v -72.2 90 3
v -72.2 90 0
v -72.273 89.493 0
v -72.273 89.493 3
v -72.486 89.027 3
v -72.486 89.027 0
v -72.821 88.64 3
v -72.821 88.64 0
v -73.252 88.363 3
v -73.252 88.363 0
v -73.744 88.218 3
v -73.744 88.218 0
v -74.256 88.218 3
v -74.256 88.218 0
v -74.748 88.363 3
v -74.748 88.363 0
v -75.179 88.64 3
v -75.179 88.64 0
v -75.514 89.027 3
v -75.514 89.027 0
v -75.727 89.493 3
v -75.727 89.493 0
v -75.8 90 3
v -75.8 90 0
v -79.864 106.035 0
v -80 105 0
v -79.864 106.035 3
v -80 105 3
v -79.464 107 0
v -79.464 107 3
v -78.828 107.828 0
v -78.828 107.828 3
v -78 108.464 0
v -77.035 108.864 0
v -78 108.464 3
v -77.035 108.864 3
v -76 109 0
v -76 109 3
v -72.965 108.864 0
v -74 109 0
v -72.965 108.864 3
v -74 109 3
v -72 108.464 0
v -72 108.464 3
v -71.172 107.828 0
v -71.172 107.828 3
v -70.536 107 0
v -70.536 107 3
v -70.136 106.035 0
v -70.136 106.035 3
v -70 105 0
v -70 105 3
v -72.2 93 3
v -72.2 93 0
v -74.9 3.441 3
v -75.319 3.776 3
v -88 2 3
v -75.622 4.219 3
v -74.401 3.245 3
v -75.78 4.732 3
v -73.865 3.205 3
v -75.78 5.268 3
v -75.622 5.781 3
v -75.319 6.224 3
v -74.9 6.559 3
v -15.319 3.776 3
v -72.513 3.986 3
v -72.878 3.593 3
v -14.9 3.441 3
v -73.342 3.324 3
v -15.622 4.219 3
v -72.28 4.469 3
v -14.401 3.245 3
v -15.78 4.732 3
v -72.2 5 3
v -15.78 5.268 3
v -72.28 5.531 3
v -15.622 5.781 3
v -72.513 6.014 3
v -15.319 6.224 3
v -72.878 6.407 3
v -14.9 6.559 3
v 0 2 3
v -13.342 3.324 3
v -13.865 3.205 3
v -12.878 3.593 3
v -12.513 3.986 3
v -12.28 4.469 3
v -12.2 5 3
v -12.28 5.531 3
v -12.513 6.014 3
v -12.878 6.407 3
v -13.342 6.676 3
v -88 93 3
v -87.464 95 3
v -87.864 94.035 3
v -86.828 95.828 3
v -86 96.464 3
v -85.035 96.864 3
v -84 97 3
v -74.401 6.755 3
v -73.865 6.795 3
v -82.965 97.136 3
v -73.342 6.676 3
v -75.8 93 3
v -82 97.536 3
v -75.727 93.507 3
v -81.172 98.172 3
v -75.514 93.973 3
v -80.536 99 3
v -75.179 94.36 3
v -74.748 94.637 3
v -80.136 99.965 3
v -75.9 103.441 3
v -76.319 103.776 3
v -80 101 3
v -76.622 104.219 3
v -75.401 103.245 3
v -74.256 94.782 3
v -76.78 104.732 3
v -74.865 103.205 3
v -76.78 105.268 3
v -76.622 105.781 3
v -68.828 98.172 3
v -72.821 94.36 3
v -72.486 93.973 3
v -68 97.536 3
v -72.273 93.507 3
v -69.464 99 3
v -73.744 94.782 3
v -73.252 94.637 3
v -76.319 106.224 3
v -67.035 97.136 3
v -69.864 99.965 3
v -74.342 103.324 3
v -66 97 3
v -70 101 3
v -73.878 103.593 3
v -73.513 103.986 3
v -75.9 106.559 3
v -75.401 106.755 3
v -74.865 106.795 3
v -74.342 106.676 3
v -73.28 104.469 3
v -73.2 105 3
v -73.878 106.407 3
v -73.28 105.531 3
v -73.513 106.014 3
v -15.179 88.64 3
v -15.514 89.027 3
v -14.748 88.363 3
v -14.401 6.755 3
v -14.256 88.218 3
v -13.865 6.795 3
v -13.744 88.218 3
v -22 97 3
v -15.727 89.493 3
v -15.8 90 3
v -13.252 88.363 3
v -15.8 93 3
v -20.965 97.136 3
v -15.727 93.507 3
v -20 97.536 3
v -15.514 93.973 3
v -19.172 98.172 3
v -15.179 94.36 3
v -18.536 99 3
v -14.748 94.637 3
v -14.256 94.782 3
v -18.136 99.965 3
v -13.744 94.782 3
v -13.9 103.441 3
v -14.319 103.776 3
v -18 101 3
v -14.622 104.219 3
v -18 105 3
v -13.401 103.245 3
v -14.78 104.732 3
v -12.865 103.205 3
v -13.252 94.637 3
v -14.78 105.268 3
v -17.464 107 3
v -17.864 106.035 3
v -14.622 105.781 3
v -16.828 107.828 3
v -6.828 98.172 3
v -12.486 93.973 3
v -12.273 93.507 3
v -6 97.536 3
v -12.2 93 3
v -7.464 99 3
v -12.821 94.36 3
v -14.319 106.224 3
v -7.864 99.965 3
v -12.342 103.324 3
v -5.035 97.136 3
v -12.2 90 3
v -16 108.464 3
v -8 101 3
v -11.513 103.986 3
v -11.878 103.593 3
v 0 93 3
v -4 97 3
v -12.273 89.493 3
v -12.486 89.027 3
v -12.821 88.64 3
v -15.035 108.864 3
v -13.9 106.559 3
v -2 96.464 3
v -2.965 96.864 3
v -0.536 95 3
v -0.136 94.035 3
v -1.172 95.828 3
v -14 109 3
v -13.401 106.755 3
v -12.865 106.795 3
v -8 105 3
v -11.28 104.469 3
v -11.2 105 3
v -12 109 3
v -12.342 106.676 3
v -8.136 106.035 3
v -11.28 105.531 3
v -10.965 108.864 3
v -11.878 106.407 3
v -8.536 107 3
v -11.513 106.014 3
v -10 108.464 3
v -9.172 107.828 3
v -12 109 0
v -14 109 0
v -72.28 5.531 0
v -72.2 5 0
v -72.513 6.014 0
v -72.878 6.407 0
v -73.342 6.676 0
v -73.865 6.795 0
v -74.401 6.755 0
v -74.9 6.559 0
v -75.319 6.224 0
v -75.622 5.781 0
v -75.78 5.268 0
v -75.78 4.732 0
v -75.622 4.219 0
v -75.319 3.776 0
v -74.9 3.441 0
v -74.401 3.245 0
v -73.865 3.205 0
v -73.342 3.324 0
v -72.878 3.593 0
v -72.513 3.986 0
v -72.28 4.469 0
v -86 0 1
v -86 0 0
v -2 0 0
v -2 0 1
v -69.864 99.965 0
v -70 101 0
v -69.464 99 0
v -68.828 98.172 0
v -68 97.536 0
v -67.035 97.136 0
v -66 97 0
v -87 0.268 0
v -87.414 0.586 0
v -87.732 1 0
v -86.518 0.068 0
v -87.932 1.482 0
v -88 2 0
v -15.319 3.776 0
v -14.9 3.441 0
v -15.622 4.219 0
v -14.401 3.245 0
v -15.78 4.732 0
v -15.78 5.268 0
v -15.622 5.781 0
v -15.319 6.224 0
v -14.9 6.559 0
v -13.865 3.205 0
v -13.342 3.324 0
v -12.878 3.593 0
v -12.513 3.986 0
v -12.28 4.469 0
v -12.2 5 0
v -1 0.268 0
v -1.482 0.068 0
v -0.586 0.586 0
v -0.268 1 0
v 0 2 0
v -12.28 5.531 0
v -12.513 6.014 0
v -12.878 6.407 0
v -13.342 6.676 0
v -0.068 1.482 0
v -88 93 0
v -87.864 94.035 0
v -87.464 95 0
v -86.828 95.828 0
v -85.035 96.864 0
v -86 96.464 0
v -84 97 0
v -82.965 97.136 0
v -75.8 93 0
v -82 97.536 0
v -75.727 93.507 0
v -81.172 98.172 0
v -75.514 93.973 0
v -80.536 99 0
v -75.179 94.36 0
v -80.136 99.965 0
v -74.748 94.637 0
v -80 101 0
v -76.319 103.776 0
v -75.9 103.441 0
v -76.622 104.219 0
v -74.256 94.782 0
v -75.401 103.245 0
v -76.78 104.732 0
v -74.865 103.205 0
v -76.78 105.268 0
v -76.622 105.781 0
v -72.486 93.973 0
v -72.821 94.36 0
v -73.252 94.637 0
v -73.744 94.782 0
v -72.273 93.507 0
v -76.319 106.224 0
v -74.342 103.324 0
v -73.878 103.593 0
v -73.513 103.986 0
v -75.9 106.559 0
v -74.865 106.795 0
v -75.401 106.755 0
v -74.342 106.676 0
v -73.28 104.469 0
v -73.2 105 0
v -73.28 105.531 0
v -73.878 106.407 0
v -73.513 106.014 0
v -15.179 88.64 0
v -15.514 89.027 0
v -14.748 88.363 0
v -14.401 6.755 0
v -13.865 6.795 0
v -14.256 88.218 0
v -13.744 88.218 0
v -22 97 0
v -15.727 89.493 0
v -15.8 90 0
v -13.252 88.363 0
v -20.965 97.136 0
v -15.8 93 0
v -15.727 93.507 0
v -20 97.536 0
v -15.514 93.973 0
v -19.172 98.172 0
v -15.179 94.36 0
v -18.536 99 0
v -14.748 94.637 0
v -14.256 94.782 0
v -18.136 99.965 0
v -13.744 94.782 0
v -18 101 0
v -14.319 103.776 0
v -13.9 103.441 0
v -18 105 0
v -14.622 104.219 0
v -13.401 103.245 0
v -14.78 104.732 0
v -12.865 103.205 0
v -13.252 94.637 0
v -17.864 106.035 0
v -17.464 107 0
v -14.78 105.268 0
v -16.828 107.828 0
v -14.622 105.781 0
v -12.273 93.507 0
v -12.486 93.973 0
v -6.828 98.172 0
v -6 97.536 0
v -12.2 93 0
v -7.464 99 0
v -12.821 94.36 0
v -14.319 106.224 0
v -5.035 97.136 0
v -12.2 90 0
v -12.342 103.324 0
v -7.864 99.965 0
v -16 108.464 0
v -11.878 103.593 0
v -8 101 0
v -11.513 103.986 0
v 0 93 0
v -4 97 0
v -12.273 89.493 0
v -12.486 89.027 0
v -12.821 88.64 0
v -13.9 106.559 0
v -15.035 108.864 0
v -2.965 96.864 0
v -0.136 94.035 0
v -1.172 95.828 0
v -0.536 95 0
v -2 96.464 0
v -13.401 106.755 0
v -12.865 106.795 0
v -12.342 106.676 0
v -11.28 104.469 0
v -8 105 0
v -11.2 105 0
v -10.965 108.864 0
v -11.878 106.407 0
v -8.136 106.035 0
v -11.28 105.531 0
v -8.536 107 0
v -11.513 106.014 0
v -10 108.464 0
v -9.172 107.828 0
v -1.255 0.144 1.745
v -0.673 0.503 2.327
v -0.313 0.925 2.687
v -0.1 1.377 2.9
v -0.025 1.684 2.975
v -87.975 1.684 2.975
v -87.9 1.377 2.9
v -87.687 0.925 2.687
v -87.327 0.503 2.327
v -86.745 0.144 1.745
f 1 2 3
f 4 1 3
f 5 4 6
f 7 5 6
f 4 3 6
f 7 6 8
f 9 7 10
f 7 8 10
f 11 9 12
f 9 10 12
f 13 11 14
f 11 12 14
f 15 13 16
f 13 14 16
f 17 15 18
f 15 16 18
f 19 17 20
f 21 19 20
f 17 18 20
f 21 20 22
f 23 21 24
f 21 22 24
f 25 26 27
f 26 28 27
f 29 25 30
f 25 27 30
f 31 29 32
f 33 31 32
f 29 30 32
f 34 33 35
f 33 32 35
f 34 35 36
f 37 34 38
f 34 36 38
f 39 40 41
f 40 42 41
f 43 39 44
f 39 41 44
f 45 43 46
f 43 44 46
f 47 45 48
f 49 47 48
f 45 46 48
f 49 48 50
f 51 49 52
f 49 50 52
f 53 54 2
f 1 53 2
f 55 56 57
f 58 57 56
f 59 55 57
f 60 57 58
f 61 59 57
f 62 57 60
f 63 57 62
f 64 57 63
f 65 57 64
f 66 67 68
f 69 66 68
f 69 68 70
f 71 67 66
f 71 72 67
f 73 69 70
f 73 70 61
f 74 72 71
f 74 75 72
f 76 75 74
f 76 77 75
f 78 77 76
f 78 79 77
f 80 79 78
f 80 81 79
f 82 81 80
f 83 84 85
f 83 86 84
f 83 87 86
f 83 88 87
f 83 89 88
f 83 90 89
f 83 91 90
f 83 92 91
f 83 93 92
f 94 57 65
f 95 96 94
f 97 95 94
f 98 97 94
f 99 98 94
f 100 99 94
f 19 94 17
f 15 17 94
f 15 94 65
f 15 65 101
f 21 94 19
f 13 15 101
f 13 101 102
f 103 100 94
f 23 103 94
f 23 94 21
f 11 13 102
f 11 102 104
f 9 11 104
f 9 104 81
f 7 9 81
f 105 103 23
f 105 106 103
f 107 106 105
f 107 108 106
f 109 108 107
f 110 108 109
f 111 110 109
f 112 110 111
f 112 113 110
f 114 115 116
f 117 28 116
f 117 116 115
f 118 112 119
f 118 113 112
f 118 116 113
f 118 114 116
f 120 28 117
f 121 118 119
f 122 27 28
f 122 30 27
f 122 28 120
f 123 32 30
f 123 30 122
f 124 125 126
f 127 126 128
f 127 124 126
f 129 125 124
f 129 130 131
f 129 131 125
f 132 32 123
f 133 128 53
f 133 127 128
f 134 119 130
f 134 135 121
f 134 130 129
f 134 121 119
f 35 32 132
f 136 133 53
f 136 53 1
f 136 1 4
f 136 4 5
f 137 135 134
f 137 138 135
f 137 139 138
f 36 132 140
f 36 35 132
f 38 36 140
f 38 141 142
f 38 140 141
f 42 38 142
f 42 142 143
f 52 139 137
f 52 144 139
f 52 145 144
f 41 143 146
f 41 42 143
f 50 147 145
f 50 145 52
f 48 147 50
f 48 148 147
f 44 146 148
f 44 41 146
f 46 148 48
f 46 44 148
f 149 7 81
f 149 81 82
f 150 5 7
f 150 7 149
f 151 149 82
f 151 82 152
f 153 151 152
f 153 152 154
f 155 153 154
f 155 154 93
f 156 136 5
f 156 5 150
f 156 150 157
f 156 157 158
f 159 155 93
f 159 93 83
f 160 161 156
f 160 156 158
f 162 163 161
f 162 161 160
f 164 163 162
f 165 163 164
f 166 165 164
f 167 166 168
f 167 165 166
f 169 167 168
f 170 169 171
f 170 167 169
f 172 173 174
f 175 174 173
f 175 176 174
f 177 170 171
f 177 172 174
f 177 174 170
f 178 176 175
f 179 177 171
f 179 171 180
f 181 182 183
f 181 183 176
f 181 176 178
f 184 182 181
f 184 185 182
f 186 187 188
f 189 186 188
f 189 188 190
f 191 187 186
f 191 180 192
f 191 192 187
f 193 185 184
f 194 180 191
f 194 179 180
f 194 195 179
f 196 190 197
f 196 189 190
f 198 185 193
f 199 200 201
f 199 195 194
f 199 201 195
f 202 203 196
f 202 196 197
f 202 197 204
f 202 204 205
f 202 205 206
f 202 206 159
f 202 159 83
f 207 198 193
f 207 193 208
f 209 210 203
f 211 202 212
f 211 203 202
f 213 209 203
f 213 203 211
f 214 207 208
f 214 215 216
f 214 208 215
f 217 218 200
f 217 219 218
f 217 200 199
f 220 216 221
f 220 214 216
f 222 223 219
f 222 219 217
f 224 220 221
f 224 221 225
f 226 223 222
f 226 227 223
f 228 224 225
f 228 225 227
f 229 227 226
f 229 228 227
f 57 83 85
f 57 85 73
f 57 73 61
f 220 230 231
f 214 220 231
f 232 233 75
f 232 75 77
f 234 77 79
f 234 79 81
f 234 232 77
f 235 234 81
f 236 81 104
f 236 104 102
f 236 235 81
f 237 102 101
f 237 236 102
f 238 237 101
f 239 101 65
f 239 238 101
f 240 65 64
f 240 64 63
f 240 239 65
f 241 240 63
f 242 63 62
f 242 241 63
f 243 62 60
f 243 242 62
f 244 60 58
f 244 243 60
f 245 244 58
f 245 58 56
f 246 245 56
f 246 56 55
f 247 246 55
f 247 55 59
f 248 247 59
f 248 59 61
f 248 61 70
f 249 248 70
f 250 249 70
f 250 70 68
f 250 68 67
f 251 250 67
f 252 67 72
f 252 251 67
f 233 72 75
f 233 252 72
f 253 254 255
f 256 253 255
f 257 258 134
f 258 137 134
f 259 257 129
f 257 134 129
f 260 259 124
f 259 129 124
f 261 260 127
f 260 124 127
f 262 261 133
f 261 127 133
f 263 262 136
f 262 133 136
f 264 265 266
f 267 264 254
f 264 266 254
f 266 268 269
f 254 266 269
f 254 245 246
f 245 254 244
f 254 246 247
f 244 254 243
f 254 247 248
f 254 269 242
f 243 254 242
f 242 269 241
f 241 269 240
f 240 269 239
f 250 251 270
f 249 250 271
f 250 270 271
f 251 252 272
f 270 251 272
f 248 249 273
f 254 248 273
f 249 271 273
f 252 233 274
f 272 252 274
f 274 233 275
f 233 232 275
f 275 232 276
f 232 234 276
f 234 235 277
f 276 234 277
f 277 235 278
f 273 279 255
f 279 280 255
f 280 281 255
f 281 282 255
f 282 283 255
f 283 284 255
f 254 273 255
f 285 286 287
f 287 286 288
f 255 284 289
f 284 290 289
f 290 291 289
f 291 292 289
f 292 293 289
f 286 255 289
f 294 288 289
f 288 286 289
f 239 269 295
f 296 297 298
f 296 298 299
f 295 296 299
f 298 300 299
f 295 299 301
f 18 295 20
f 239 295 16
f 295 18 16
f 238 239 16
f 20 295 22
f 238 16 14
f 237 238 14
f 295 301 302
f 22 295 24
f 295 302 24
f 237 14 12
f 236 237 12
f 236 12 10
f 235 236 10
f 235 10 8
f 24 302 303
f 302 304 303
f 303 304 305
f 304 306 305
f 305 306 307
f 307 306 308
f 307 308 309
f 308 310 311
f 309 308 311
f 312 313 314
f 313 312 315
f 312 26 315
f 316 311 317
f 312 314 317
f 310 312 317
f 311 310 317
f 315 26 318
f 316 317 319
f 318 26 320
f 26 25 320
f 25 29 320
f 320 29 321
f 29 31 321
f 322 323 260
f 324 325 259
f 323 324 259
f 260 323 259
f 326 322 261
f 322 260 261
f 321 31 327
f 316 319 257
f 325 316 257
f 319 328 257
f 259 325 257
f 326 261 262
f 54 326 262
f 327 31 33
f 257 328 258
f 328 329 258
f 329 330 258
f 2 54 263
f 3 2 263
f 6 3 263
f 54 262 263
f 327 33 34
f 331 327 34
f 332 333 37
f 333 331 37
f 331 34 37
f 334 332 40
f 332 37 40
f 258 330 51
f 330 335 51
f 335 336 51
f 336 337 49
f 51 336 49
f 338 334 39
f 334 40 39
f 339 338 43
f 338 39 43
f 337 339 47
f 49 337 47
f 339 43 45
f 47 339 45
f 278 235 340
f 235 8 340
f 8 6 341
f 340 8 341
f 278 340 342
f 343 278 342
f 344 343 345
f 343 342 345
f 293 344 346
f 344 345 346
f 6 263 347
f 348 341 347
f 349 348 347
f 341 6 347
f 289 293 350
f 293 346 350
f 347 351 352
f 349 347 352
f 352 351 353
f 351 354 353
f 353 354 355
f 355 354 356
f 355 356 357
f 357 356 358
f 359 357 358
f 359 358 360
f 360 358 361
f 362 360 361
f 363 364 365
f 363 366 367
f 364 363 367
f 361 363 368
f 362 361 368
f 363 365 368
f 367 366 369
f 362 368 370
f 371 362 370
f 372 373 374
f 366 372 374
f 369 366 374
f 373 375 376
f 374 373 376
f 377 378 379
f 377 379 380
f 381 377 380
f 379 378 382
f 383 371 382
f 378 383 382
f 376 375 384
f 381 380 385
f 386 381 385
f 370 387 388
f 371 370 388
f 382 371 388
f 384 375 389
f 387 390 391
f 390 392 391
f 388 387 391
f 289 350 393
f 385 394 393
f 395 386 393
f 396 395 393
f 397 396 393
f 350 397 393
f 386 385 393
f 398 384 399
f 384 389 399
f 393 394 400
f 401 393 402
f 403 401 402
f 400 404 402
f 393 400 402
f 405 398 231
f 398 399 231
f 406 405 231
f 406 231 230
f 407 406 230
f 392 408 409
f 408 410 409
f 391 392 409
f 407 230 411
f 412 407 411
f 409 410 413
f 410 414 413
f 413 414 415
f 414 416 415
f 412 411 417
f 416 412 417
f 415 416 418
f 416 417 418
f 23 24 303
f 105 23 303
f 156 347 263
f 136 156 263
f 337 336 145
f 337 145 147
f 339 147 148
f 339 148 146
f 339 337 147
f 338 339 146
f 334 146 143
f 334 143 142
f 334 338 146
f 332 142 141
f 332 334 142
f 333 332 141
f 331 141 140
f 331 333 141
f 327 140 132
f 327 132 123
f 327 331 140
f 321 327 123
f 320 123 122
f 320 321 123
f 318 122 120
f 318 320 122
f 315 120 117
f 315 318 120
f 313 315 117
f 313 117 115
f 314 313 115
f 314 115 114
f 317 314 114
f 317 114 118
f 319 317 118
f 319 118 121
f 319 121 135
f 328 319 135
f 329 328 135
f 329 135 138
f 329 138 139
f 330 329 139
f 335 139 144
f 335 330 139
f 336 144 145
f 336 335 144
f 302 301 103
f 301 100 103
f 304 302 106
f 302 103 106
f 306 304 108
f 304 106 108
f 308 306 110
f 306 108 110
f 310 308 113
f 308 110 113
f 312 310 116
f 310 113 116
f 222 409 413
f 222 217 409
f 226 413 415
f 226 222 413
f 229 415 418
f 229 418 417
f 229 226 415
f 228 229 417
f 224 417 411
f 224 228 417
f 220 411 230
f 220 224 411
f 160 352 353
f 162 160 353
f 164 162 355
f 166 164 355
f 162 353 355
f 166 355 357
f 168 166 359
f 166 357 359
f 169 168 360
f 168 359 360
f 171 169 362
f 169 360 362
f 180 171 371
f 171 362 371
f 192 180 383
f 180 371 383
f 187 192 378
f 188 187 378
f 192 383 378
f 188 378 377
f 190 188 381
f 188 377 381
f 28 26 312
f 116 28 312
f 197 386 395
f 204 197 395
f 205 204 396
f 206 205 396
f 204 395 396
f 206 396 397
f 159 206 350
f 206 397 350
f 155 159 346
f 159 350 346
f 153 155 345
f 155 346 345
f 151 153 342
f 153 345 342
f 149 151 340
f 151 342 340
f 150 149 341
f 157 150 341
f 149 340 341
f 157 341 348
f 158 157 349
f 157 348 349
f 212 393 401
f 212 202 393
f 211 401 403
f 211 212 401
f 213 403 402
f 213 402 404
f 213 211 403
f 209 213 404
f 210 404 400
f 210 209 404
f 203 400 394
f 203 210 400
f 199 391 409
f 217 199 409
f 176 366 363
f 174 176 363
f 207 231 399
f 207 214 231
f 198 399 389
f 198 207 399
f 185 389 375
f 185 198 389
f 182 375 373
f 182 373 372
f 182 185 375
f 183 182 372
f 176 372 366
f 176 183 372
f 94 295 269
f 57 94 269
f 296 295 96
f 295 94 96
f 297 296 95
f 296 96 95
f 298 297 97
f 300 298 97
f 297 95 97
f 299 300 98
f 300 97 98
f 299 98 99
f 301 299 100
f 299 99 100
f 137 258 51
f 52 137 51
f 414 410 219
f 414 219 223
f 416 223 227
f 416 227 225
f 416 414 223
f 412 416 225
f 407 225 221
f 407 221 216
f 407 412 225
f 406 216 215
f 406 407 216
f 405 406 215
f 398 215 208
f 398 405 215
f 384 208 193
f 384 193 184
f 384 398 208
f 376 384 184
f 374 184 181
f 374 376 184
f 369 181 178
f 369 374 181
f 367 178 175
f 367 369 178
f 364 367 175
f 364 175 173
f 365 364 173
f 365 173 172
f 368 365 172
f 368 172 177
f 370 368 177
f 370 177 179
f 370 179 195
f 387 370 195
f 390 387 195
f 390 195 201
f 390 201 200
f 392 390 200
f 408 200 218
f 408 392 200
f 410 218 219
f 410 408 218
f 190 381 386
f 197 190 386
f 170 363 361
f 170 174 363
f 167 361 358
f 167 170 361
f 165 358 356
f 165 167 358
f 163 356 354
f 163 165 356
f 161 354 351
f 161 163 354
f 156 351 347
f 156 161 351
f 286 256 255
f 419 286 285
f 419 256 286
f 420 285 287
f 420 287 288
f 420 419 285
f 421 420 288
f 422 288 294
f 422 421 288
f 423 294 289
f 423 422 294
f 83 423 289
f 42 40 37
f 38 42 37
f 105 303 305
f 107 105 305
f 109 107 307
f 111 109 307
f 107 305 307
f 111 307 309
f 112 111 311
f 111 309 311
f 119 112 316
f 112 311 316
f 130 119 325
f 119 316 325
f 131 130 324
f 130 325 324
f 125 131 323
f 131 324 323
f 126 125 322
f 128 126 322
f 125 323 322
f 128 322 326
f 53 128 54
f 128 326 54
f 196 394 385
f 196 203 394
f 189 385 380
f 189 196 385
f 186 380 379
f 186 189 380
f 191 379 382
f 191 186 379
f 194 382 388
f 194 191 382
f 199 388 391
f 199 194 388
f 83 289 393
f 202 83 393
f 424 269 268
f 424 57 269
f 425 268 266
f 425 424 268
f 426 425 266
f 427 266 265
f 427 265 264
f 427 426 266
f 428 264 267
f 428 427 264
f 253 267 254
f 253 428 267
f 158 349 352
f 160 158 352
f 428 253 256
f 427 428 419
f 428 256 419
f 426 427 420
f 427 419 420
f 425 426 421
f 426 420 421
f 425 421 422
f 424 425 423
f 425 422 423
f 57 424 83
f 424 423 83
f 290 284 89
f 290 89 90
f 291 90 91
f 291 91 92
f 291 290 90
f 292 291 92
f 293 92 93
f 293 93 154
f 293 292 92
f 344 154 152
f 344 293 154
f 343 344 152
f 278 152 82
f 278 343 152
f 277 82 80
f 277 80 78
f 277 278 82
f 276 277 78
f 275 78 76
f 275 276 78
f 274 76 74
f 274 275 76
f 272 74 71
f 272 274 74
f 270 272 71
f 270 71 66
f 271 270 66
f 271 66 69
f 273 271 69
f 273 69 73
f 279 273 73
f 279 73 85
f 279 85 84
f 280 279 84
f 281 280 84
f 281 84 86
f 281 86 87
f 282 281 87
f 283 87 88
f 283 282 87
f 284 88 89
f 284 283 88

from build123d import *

# Parameters (mm, degrees)
SKETCH1_R           = 1.8
BOSS_EXTRUDE1_DEPTH = 3
FILLET1_R           = 4
FILLET2_R           = 2


with BuildPart() as part:
    # Sketch1 → Boss-Extrude1 (new body)
    with BuildSketch(Plane.XY):
        Polygon((-88, 0), (0, 0), (0, 97), (-8, 97), (-8, 109), (-18, 109), (-18, 97), (-70, 97), (-70, 109), (-80, 109), (-80, 97), (-88, 97), align=None)
        with Locations((-74, 5)):
            Circle(SKETCH1_R, mode=Mode.SUBTRACT)
        with Locations((-14, 5)):
            Circle(SKETCH1_R, mode=Mode.SUBTRACT)
        with BuildLine():
            ThreePointArc((-75.8, 93), (-74, 94.8), (-72.2, 93))
            Line((-72.2, 93), (-72.2, 90))
            ThreePointArc((-72.2, 90), (-74, 88.2), (-75.8, 90))
            Line((-75.8, 90), (-75.8, 93))
        make_face(mode=Mode.SUBTRACT)
        with BuildLine():
            ThreePointArc((-12.2, 90), (-14, 88.2), (-15.8, 90))
            Line((-15.8, 90), (-15.8, 93))
            ThreePointArc((-15.8, 93), (-14, 94.8), (-12.2, 93))
            Line((-12.2, 93), (-12.2, 90))
        make_face(mode=Mode.SUBTRACT)
        with Locations((-13, 105)):
            Circle(SKETCH1_R, mode=Mode.SUBTRACT)
        with Locations((-75, 105)):
            Circle(SKETCH1_R, mode=Mode.SUBTRACT)
    extrude(amount=BOSS_EXTRUDE1_DEPTH)

    # Fillet1
    fillet1_edges = [part.edges().sort_by_distance(p)[0] for p in [
        (-70, 109, 1.5),
        (-70, 97, 1.5),
        (-18, 97, 1.5),
        (-18, 109, 1.5),
        (-8, 109, 1.5),
        (-8, 97, 1.5),
        (0, 97, 1.5),
        (-88, 97, 1.5),
        (-80, 97, 1.5),
        (-80, 109, 1.5),
    ]]
    fillet(fillet1_edges, radius=FILLET1_R - 0.0001)  # a hair under: the kernel refuses the full size

    # Fillet2
    fillet2_edges = [part.edges().sort_by_distance(p)[0] for p in [
        (-44, 0, 3),
        (0, 0, 1.5),
        (-88, 0, 1.5),
    ]]
    fillet(fillet2_edges, radius=FILLET2_R)


solid = part.part
